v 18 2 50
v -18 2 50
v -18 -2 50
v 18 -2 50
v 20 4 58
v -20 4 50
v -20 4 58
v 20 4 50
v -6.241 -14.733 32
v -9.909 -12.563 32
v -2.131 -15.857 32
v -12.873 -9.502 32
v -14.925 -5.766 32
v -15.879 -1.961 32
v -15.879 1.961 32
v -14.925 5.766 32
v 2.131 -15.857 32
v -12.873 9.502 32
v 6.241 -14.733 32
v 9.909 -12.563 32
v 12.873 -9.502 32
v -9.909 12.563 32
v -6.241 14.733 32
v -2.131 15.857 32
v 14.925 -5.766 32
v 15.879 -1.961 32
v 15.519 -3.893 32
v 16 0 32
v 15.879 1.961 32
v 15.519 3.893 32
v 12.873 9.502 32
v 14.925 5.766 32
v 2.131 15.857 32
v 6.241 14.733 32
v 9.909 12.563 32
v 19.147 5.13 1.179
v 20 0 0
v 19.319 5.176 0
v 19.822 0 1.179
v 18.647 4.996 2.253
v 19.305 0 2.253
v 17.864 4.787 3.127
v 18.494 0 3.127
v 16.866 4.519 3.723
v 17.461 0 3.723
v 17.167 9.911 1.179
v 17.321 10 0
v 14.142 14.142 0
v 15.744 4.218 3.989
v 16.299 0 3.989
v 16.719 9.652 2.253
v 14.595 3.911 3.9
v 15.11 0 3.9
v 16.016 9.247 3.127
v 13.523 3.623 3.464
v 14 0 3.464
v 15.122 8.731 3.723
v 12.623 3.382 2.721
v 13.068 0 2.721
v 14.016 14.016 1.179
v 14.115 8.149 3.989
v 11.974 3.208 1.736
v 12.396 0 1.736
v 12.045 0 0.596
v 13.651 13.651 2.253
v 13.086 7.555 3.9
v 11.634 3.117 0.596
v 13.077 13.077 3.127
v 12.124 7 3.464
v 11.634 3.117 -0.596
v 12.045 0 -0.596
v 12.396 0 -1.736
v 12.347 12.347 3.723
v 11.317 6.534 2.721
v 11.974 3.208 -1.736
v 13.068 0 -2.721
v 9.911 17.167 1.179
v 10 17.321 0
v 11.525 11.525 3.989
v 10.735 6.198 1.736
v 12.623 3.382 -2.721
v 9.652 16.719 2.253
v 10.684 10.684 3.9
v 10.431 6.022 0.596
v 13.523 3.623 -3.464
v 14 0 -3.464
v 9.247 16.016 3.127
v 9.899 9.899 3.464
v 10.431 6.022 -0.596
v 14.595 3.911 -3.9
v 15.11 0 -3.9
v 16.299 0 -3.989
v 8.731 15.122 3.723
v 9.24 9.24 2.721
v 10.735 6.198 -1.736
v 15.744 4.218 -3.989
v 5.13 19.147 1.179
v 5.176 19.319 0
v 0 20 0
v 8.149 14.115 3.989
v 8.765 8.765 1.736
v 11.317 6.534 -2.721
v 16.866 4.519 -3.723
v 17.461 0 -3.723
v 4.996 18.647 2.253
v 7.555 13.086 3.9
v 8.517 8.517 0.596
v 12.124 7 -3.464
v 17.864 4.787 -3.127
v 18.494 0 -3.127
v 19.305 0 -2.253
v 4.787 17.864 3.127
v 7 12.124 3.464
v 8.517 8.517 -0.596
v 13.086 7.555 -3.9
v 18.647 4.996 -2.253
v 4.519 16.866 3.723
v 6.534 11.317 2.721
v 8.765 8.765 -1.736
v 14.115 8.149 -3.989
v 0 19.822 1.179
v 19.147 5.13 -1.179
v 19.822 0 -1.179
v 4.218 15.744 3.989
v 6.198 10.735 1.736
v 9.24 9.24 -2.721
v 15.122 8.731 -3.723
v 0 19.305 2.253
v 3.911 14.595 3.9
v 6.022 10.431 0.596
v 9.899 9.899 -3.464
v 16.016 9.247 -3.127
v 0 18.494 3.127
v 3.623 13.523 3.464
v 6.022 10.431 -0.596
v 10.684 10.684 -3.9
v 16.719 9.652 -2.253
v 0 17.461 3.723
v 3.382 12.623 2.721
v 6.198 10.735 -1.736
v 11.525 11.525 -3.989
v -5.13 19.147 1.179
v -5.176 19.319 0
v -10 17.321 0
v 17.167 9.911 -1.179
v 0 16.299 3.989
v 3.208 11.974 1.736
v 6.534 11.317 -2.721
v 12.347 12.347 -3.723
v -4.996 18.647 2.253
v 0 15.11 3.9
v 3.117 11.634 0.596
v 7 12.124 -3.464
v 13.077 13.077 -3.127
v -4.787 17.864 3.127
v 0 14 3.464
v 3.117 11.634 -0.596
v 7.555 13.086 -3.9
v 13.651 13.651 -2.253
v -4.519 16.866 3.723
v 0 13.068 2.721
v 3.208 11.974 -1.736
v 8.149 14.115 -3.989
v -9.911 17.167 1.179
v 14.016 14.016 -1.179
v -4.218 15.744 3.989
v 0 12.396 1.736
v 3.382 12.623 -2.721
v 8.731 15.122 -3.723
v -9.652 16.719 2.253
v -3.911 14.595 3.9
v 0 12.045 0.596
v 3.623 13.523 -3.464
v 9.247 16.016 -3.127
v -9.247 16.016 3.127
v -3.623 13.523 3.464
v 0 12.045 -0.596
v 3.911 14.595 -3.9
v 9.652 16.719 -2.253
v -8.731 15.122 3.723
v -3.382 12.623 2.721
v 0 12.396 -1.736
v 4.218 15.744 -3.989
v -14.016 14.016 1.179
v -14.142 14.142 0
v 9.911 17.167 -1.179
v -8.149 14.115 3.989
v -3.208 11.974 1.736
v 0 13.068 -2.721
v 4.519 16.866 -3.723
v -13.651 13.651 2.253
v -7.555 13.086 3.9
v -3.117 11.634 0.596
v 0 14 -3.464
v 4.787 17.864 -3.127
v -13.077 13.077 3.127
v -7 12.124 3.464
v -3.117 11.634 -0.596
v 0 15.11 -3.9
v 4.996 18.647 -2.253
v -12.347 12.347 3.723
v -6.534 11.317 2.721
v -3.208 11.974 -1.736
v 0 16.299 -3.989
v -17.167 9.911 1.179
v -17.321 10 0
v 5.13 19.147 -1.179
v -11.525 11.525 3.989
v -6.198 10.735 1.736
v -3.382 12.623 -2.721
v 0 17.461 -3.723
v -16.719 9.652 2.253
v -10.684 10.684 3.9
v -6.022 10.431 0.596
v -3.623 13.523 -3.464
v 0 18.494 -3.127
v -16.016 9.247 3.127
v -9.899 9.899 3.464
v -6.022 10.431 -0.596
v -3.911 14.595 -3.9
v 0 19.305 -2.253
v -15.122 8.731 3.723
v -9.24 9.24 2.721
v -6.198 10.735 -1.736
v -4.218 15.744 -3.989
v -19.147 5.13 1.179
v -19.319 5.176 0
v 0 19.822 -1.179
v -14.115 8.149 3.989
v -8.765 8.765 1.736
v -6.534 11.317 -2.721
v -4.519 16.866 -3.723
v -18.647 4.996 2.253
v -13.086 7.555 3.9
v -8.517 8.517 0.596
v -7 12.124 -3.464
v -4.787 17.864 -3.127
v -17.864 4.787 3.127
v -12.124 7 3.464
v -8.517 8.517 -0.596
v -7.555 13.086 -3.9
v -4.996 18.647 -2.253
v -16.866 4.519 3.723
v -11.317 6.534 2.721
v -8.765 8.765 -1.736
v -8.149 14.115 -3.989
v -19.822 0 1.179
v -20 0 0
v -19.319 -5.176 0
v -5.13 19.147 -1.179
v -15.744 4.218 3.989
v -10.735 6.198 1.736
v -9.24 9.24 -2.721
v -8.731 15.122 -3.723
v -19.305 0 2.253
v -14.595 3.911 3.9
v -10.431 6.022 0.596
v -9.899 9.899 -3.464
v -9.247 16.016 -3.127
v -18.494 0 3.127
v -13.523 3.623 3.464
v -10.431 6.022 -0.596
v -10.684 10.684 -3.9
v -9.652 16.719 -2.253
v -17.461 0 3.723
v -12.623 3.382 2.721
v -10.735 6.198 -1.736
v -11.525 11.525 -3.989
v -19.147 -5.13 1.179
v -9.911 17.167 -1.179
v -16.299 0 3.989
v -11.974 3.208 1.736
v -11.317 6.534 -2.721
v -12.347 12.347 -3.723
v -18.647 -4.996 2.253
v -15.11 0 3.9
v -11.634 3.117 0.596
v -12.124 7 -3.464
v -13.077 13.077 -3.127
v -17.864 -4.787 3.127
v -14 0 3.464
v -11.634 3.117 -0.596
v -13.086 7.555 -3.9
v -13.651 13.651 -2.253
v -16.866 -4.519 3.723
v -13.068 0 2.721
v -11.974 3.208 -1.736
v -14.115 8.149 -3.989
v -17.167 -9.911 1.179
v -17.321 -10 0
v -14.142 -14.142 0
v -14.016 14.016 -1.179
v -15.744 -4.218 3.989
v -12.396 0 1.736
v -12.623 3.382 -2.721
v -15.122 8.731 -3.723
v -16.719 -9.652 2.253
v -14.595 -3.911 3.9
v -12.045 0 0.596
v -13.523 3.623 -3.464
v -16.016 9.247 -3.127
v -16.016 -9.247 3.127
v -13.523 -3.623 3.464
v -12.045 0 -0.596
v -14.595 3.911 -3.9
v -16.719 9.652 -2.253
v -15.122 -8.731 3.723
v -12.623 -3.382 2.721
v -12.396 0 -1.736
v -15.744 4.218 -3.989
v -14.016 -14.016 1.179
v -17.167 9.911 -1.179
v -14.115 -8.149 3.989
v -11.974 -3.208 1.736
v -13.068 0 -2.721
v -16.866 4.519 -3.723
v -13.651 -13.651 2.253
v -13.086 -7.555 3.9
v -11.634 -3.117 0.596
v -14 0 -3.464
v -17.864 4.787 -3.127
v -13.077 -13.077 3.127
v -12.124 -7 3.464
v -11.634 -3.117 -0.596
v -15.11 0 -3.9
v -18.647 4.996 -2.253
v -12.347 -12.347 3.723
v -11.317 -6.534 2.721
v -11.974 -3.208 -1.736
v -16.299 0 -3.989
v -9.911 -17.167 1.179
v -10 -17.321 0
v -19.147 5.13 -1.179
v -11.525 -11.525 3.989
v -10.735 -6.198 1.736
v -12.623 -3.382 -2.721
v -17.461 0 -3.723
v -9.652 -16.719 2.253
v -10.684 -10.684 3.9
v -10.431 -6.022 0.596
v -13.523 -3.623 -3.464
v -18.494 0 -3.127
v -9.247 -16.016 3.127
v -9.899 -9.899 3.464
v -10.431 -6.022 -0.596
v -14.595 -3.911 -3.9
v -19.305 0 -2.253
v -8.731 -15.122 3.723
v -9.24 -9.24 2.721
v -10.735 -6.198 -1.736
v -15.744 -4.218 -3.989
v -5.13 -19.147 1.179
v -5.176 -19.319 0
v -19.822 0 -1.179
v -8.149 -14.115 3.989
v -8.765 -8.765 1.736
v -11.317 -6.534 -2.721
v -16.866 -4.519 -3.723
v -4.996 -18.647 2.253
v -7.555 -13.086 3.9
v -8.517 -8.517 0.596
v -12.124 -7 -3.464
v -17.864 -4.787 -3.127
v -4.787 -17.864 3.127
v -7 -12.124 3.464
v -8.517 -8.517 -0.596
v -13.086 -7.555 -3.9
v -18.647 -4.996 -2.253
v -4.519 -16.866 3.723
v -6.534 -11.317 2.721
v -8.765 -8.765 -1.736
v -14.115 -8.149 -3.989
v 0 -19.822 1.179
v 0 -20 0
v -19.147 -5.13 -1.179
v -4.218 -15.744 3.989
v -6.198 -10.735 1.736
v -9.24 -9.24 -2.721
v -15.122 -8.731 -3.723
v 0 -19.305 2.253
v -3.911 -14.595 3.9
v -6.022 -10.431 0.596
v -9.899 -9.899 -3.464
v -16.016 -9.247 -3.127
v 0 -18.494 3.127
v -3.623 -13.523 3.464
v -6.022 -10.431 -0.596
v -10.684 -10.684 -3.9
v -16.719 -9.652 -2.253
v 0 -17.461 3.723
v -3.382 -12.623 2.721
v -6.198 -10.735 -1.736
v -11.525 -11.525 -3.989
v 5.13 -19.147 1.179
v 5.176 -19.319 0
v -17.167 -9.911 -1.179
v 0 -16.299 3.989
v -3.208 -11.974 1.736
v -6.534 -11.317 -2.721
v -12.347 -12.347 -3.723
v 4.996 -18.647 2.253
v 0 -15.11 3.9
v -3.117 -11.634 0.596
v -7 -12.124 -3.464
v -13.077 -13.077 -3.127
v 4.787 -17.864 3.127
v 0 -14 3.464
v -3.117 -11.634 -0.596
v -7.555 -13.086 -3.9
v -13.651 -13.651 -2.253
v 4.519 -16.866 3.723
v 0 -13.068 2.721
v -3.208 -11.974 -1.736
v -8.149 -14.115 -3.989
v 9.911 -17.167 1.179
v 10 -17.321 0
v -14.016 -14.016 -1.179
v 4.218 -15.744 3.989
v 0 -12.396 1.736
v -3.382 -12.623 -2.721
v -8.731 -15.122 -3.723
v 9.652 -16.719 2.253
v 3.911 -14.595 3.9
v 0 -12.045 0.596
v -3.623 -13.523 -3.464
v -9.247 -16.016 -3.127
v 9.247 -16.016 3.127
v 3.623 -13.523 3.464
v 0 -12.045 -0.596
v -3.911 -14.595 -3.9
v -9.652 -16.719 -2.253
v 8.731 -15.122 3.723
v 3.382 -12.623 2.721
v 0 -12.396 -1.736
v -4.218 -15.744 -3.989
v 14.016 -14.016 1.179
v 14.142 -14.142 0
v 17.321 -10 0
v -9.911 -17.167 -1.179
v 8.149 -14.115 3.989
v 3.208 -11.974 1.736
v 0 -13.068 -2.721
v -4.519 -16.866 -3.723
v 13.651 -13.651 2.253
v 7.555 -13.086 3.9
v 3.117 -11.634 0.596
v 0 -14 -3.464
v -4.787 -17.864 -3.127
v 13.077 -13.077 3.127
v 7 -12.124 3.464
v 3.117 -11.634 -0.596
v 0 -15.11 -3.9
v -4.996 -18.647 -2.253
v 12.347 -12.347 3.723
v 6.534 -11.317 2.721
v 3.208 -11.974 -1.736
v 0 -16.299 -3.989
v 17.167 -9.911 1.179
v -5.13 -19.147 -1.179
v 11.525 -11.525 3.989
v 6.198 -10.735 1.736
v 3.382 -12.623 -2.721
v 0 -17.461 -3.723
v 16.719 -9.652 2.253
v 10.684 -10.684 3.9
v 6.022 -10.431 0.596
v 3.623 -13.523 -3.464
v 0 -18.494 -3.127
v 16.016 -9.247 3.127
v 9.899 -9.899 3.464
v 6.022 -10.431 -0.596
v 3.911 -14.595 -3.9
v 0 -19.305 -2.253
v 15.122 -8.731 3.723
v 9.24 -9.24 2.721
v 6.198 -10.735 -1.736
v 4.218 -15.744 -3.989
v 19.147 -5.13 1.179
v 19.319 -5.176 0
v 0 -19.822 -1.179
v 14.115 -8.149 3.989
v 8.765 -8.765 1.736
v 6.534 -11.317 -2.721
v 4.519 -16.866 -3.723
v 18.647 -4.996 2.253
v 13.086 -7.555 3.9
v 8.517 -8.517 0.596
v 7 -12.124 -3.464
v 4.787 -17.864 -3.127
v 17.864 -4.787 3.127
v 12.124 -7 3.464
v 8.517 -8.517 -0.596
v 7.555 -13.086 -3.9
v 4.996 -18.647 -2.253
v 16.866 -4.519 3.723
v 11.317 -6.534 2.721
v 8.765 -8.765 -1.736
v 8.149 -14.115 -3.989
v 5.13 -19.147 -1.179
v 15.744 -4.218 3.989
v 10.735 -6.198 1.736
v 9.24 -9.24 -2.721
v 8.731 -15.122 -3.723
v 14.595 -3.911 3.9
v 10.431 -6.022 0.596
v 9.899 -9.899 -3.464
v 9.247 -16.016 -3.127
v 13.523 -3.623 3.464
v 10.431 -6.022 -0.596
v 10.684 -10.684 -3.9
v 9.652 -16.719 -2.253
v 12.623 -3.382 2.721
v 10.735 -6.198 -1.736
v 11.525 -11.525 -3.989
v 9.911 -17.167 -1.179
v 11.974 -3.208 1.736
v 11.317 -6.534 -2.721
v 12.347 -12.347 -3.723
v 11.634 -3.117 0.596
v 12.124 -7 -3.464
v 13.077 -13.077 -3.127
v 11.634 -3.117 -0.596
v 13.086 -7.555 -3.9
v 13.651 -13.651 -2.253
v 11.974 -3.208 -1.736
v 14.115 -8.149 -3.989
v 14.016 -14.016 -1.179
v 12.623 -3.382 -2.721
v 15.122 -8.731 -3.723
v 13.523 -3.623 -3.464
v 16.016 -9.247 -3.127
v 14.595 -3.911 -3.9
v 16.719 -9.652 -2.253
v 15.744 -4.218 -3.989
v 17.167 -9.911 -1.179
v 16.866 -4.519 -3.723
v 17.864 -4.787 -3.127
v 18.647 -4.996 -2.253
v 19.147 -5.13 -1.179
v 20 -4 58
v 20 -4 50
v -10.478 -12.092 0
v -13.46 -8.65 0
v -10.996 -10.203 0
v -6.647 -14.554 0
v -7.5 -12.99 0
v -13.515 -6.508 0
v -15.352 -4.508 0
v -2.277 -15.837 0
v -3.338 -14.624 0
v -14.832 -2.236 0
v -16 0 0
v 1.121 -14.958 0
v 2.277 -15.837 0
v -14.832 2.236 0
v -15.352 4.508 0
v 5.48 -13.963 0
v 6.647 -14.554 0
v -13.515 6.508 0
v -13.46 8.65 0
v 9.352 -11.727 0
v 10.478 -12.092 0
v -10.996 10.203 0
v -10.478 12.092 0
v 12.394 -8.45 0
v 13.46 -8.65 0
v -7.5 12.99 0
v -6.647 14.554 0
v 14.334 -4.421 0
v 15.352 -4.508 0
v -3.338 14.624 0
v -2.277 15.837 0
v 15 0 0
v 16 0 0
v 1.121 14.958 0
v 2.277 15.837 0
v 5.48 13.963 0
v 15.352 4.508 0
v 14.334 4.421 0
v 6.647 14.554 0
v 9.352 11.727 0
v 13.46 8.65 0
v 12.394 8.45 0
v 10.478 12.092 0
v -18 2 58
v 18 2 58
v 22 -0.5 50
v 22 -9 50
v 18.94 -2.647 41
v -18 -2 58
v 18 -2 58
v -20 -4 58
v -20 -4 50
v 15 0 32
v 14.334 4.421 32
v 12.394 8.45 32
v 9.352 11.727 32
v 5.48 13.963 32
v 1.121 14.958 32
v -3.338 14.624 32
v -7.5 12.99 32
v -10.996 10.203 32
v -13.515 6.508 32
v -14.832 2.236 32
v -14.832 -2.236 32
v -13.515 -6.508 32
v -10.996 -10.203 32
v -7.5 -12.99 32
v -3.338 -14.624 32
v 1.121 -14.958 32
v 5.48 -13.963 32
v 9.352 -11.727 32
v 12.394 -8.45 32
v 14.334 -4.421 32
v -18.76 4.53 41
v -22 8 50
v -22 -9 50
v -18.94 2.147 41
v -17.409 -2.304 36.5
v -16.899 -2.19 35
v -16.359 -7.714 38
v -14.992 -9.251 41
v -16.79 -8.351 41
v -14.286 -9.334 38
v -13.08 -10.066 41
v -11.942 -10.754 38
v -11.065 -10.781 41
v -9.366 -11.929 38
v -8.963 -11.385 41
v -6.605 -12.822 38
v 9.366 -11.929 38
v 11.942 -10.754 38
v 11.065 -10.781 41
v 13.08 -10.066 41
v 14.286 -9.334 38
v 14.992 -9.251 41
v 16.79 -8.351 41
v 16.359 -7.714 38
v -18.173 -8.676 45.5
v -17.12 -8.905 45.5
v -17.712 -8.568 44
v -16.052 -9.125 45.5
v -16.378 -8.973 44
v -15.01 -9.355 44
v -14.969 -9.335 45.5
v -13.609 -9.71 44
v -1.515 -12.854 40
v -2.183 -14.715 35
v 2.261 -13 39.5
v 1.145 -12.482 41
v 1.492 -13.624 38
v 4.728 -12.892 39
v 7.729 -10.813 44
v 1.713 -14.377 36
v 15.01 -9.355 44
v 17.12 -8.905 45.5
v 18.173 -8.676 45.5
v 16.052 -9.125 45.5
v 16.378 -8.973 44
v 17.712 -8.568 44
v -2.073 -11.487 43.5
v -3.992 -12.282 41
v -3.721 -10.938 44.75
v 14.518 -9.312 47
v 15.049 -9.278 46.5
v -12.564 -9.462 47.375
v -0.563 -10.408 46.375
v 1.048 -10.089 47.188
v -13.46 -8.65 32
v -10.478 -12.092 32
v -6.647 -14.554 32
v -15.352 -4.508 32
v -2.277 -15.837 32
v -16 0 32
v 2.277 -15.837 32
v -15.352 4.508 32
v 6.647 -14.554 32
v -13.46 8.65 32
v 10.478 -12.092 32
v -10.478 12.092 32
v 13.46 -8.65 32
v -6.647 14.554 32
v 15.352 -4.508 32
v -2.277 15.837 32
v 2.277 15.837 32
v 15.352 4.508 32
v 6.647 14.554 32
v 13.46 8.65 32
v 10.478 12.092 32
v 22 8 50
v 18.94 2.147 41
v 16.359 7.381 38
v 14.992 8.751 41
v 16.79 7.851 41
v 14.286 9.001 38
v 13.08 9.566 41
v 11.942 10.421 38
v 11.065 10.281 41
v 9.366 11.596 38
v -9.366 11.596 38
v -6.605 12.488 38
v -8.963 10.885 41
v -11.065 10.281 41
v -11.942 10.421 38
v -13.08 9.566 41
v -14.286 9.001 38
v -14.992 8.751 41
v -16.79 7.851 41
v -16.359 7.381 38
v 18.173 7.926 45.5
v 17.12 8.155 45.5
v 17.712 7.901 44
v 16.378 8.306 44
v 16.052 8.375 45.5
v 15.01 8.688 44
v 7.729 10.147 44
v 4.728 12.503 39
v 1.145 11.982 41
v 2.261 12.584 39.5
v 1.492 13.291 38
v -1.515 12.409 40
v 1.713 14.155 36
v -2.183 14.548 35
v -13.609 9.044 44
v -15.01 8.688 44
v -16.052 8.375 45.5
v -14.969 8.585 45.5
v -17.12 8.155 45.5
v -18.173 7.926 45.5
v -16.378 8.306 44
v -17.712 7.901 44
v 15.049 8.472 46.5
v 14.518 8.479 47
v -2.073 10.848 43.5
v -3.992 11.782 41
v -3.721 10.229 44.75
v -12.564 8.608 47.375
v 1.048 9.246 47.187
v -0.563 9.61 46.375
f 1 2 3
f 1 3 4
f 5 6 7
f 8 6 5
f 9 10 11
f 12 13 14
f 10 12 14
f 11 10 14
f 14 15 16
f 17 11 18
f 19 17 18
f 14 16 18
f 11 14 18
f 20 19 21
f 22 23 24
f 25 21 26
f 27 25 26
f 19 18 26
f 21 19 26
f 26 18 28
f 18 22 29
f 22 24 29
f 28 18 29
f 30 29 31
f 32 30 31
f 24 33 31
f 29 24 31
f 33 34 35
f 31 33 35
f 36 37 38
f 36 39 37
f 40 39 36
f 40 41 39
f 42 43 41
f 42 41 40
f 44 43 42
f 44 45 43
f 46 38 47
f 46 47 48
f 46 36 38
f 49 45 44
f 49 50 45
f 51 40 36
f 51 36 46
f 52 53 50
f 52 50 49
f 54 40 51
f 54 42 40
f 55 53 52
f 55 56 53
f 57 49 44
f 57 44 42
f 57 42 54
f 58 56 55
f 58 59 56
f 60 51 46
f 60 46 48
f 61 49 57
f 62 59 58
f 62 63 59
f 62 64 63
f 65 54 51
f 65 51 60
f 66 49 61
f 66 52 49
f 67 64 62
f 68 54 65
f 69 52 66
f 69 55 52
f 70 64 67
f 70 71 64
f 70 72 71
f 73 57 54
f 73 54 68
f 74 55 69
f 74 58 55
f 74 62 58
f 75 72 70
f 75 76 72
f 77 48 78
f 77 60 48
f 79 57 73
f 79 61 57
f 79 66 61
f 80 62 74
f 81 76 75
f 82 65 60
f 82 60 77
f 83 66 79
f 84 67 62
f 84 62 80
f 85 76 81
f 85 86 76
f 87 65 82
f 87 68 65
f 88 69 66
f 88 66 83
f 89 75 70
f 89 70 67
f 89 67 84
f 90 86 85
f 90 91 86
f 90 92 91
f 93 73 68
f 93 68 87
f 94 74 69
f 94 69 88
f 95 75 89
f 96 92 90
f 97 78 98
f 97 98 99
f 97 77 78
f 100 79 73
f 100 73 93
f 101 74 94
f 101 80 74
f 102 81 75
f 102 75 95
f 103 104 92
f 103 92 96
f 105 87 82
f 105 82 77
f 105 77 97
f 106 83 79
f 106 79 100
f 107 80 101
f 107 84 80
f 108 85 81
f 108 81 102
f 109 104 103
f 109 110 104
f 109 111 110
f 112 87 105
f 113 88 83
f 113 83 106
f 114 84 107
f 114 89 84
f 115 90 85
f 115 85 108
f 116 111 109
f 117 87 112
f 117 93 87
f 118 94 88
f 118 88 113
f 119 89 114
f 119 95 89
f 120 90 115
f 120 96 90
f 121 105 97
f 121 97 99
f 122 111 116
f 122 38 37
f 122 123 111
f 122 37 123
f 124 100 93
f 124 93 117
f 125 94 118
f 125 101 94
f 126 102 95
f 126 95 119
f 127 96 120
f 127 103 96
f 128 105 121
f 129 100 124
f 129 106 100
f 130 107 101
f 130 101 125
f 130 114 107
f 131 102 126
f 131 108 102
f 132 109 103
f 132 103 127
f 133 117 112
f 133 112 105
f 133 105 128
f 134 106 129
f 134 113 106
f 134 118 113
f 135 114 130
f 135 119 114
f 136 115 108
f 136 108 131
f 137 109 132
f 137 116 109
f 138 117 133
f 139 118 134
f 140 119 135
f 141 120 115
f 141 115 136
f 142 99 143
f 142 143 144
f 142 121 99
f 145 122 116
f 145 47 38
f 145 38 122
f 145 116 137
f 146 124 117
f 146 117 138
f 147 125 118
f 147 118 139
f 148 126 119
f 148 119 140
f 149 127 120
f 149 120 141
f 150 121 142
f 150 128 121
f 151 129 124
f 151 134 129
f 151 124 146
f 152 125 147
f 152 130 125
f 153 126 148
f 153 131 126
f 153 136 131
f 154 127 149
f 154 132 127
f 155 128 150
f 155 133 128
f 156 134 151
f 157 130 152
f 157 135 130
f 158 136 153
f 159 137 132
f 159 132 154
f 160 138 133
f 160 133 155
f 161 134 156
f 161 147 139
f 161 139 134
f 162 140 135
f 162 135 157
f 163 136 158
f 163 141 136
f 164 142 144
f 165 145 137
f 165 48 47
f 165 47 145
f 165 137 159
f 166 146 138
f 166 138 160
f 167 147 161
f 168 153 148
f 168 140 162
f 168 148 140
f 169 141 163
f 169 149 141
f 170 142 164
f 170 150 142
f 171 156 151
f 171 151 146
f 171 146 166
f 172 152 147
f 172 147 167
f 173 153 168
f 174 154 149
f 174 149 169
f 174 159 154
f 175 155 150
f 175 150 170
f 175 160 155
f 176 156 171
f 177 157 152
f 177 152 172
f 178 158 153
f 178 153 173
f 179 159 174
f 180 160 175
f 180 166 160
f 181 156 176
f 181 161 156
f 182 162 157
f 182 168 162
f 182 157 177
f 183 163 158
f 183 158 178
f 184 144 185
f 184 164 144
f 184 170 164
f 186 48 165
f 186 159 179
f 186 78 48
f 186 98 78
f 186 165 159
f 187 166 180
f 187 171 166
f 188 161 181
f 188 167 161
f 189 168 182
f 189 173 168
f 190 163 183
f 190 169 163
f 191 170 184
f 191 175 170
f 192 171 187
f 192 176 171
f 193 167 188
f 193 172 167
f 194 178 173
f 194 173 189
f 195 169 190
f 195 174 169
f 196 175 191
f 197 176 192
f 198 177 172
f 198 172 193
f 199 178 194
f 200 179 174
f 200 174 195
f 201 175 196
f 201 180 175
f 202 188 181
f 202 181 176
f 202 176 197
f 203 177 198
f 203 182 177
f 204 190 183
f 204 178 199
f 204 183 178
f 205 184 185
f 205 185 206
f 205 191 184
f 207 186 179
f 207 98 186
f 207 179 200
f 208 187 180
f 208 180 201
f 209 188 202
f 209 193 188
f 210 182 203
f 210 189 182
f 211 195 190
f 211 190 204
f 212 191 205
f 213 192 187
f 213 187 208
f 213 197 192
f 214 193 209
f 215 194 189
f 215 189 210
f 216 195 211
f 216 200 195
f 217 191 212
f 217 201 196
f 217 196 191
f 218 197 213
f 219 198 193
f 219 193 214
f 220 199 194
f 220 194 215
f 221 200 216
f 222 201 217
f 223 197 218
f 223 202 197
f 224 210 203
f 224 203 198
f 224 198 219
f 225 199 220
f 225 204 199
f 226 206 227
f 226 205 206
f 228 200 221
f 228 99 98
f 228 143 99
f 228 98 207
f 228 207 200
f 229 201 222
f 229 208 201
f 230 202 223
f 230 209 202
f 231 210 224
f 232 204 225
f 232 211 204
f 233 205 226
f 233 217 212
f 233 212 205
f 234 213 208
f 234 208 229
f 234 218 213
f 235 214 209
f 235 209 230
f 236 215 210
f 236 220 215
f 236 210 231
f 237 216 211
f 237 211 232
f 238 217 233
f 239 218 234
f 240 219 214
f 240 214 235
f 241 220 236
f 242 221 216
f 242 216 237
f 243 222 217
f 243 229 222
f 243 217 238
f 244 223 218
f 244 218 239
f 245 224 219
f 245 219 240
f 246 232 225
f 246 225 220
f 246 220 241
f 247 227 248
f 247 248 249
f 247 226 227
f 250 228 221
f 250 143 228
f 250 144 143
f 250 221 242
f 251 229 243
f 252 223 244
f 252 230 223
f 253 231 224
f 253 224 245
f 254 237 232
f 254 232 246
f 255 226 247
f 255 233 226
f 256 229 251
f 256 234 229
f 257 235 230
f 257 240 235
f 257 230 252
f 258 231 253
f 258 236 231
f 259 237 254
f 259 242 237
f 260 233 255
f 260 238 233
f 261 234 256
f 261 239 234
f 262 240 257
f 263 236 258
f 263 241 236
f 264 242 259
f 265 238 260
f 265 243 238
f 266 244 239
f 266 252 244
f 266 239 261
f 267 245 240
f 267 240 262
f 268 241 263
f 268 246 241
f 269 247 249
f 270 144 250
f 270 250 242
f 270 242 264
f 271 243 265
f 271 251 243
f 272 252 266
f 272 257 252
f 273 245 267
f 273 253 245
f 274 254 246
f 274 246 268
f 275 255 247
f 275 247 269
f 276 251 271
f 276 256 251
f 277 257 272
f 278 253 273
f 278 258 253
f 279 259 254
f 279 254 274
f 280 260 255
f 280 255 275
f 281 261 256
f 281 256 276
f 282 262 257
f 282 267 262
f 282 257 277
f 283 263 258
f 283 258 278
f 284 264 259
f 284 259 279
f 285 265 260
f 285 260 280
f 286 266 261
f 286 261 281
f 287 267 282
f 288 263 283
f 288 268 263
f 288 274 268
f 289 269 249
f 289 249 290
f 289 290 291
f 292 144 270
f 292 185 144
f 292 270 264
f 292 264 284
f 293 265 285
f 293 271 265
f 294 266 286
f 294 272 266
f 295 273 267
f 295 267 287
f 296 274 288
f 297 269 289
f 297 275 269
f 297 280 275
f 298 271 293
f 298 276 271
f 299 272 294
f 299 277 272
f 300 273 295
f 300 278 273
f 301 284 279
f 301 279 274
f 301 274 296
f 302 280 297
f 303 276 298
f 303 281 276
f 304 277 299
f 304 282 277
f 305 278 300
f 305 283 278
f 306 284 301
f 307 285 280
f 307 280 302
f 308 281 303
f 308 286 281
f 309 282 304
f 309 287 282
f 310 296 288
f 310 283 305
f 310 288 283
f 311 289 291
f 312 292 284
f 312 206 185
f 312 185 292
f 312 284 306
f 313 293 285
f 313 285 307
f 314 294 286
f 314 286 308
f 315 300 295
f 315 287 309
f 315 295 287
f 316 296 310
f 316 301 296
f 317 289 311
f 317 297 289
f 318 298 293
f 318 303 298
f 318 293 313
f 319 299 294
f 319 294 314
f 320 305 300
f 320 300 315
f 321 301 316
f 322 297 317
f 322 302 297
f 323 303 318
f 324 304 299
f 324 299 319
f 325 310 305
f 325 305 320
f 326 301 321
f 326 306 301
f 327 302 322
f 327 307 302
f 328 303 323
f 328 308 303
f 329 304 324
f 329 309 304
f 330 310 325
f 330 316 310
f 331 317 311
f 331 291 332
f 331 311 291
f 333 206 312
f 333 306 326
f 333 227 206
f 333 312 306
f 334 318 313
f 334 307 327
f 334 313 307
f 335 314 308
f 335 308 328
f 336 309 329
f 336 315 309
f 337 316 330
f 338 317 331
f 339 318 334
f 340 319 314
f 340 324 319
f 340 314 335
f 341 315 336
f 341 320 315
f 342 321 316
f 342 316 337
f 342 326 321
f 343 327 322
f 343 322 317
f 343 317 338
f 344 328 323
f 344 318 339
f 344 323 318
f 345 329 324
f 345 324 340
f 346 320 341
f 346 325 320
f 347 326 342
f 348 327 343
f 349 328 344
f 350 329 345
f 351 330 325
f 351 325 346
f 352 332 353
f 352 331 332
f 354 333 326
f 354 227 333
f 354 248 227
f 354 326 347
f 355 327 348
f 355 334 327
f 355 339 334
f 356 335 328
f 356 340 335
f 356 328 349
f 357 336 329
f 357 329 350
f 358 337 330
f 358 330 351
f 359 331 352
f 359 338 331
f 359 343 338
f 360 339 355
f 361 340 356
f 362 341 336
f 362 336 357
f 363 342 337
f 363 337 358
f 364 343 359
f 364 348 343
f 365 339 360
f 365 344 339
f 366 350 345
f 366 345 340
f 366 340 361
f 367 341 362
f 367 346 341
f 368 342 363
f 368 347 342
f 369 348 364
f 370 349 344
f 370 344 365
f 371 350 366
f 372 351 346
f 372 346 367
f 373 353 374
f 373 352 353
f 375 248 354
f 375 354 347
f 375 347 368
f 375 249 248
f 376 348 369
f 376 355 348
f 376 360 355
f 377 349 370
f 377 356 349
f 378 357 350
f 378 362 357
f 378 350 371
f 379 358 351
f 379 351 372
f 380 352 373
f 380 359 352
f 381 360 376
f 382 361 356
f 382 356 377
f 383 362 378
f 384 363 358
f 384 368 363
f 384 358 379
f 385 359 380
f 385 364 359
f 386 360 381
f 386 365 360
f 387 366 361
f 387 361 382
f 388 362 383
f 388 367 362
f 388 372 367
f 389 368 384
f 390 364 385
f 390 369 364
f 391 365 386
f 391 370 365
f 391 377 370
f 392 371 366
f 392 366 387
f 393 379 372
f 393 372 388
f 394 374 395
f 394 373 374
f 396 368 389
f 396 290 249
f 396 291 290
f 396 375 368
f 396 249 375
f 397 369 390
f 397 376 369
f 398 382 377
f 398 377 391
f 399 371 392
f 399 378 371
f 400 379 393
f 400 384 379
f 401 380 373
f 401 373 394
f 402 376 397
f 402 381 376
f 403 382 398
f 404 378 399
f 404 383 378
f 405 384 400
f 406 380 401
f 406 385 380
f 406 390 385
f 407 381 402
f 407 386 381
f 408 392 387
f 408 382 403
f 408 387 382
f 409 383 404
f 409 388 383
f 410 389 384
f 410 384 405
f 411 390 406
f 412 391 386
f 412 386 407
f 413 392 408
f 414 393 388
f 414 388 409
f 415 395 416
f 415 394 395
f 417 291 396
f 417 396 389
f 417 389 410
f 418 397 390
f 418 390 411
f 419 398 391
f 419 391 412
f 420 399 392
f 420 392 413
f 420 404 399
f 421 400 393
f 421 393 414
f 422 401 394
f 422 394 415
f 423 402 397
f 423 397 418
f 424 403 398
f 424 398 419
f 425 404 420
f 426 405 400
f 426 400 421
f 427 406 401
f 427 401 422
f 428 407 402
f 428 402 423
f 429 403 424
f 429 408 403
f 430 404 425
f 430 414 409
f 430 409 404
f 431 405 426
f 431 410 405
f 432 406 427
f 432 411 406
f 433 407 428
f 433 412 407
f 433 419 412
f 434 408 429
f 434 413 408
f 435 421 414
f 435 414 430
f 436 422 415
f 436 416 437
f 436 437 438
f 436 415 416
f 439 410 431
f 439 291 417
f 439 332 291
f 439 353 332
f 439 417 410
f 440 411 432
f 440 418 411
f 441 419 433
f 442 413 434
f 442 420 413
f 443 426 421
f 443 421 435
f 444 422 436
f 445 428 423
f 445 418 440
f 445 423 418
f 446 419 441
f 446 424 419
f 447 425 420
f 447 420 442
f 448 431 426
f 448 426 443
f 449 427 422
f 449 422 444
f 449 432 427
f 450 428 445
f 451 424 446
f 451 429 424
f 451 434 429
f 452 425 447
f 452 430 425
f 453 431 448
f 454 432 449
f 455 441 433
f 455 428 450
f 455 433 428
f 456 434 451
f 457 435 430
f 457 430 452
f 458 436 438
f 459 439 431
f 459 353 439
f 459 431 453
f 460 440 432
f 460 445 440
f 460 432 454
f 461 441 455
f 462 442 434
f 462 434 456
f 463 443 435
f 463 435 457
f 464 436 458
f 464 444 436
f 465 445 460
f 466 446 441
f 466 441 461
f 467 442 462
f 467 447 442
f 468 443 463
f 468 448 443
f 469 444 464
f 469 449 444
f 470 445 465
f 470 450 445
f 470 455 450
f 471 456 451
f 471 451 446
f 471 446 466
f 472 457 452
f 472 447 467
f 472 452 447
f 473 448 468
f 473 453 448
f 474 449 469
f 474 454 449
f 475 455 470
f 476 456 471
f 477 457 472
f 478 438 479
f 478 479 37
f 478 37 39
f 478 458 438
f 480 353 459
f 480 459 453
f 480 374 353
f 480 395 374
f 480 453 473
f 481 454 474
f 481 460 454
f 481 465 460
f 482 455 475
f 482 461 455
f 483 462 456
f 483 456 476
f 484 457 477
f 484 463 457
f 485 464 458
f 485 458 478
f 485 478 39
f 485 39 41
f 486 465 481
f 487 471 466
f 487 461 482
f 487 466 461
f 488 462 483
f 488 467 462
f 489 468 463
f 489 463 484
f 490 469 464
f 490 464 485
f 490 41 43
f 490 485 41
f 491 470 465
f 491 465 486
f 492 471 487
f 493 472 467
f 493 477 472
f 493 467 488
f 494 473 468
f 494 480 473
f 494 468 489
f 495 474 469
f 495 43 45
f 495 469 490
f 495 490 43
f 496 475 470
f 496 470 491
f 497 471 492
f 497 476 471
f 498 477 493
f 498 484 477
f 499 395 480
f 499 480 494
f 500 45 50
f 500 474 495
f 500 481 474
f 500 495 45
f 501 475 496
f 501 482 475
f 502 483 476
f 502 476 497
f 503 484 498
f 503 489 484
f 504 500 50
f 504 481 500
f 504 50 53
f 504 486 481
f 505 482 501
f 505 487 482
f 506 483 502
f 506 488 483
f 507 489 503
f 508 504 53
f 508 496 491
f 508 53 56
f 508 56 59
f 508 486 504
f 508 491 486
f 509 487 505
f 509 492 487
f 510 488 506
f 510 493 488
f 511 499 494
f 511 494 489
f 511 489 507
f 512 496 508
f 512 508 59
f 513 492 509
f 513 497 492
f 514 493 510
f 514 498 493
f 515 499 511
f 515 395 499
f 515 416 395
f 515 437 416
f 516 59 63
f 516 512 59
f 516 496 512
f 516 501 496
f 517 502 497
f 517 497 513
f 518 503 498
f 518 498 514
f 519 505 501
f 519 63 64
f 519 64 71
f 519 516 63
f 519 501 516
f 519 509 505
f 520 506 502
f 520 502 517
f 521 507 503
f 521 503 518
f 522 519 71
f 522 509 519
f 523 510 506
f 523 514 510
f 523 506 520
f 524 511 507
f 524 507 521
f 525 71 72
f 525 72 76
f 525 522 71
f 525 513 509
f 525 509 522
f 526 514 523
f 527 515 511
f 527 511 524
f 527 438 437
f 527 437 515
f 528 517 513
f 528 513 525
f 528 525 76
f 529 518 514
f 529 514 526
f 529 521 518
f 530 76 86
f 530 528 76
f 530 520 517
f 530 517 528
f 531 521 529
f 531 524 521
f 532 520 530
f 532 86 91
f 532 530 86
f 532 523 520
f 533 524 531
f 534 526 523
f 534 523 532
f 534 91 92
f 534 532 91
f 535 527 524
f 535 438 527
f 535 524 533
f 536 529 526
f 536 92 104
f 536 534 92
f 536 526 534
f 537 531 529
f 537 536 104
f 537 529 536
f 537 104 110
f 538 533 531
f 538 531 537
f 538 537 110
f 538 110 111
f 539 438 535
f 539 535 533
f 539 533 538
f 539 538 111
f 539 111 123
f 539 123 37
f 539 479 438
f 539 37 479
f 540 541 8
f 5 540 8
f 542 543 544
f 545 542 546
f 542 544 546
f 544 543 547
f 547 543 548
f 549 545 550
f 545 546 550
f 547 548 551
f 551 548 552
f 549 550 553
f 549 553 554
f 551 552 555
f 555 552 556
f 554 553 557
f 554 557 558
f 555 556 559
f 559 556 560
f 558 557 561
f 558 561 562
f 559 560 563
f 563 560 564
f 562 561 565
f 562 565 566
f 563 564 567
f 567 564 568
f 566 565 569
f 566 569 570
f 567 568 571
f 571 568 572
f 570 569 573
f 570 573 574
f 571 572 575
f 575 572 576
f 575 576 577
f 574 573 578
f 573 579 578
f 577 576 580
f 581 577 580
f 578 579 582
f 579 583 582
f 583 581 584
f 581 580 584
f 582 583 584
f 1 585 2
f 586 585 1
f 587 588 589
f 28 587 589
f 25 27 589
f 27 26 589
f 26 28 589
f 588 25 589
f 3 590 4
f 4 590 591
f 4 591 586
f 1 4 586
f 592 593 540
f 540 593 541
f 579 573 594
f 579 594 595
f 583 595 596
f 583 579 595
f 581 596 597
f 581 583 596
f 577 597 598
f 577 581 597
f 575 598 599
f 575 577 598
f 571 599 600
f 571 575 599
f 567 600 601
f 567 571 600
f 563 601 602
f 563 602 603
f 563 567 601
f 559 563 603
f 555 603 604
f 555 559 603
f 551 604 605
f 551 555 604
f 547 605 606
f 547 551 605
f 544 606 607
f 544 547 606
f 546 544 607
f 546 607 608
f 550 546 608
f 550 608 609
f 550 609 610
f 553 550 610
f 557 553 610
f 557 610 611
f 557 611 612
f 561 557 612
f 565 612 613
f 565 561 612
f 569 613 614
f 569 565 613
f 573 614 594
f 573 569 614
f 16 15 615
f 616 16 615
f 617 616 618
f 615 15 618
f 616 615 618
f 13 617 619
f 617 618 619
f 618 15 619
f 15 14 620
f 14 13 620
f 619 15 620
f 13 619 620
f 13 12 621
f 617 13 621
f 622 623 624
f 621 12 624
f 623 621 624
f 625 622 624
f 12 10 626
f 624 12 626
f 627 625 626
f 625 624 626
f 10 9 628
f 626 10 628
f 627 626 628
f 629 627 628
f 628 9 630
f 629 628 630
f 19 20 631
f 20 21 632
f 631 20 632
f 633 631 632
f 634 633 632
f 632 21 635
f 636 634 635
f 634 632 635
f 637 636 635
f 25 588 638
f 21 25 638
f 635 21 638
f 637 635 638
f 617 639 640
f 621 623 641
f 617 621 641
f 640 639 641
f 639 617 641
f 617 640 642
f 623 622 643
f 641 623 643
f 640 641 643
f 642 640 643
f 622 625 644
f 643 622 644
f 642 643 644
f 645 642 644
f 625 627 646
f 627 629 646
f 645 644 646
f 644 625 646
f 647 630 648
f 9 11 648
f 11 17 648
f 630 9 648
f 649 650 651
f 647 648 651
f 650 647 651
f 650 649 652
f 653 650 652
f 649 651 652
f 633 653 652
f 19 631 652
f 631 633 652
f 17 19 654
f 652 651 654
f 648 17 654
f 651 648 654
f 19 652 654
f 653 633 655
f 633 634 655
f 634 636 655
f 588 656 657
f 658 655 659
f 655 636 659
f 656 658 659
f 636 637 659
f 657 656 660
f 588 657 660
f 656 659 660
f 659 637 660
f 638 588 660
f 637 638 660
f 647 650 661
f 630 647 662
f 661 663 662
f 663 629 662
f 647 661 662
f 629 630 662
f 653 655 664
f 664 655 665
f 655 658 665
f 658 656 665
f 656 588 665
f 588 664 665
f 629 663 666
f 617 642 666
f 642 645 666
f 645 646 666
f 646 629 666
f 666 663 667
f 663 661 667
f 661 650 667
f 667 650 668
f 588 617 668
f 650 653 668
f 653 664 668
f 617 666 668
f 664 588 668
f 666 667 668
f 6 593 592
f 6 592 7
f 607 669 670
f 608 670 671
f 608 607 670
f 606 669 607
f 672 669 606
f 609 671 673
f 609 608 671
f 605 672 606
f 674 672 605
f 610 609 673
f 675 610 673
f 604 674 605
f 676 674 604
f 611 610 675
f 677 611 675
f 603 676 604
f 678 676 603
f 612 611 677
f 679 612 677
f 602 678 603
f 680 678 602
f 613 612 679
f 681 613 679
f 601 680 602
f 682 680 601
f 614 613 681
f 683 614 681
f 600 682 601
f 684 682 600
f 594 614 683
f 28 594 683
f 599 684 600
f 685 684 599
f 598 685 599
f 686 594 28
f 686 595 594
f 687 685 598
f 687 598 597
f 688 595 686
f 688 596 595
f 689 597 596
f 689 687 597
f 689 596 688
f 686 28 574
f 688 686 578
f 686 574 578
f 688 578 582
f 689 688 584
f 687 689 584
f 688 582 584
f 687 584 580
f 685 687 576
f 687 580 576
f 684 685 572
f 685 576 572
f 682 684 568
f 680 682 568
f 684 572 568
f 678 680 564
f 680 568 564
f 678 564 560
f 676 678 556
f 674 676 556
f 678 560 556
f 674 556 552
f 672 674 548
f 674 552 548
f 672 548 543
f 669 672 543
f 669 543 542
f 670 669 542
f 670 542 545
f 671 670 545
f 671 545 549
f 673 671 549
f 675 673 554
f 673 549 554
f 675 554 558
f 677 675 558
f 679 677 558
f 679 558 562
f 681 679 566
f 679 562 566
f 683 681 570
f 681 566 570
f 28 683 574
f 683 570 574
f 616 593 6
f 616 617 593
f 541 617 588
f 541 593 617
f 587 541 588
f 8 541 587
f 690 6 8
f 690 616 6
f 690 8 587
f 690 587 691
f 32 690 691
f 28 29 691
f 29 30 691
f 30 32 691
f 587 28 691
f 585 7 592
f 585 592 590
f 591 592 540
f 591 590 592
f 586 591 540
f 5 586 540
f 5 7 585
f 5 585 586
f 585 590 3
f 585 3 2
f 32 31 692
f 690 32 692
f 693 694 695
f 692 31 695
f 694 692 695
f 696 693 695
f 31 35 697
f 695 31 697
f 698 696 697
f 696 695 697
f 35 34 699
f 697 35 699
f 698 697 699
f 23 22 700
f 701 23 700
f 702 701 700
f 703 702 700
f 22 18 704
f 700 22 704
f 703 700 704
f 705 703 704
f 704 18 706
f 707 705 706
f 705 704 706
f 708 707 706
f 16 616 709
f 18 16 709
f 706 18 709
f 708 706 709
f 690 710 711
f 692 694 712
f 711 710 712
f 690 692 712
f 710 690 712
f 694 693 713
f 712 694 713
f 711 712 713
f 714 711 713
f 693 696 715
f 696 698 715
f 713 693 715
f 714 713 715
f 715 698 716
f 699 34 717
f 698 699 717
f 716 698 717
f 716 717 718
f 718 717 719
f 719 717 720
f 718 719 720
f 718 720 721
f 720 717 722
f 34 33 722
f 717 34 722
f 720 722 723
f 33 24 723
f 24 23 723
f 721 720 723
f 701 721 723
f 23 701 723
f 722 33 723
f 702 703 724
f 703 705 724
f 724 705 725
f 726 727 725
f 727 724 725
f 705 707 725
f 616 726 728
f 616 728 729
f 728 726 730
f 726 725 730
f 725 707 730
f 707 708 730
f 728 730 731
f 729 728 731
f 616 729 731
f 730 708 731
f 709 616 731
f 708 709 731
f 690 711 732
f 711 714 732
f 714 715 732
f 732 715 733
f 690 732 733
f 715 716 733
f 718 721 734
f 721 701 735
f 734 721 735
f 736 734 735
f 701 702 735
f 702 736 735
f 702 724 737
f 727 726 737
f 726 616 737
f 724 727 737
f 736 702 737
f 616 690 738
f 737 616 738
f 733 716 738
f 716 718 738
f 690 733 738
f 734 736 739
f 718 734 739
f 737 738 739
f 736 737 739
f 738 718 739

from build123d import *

# Parameters (mm, degrees)
SKETCH002_W       = 44
SKETCH002_H       = 17
SKETCH001_R       = 16
SKETCH005_W       = 40
SKETCH005_H       = 8
PAD_DEPTH         = 8
SKETCH006_W       = 36
SKETCH006_H       = 4
POCKET_DEPTH      = 8
TORUS_R           = 4
CYLINDER001_R     = 15
CYLINDER001_DEPTH = 32
CYLINDER_R        = 16
CYLINDER_DEPTH    = 32


with BuildPart() as body:
    # Sketch002 (on DatumPlane) → AdditiveLoft section 0
    with BuildSketch(Plane.XY.offset(50)):
        with Locations((0, -0.5)):
            Rectangle(SKETCH002_W, SKETCH002_H)
    # Sketch001 → AdditiveLoft section 1
    with BuildSketch(Plane.XY.offset(32)):
        Circle(SKETCH001_R)
    loft(ruled=True)

    # Sketch005 → Pad (new body)
    with BuildSketch(Plane.XY.offset(50)):
        Rectangle(SKETCH005_W, SKETCH005_H)
    extrude(amount=PAD_DEPTH)

    # Sketch006 → Pocket (cut)
    with BuildSketch(Plane.XY.offset(58)):
        Rectangle(SKETCH006_W, SKETCH006_H)
    extrude(amount=-POCKET_DEPTH, mode=Mode.SUBTRACT)


with BuildPart() as torus:
    # Torus → Torus (revolve)
    with BuildSketch(Plane.XZ):
        with Locations((16, 0)):
            Circle(TORUS_R)
    revolve(axis=Axis((0, 0, 0), (0, 0, 1)))


with BuildPart() as cylinder001:
    # Cylinder001 → Cylinder001 (new body)
    with BuildSketch(Plane.XY):
        Circle(CYLINDER001_R)
    extrude(amount=CYLINDER001_DEPTH)


with BuildPart() as cut:
    # Cylinder → Cylinder (new body)
    with BuildSketch(Plane.XY):
        Circle(CYLINDER_R)
    extrude(amount=CYLINDER_DEPTH)

    # Cut: cut Cylinder001
    add(cylinder001.part, mode=Mode.SUBTRACT)


solid = Compound([body.part, torus.part, cut.part])
